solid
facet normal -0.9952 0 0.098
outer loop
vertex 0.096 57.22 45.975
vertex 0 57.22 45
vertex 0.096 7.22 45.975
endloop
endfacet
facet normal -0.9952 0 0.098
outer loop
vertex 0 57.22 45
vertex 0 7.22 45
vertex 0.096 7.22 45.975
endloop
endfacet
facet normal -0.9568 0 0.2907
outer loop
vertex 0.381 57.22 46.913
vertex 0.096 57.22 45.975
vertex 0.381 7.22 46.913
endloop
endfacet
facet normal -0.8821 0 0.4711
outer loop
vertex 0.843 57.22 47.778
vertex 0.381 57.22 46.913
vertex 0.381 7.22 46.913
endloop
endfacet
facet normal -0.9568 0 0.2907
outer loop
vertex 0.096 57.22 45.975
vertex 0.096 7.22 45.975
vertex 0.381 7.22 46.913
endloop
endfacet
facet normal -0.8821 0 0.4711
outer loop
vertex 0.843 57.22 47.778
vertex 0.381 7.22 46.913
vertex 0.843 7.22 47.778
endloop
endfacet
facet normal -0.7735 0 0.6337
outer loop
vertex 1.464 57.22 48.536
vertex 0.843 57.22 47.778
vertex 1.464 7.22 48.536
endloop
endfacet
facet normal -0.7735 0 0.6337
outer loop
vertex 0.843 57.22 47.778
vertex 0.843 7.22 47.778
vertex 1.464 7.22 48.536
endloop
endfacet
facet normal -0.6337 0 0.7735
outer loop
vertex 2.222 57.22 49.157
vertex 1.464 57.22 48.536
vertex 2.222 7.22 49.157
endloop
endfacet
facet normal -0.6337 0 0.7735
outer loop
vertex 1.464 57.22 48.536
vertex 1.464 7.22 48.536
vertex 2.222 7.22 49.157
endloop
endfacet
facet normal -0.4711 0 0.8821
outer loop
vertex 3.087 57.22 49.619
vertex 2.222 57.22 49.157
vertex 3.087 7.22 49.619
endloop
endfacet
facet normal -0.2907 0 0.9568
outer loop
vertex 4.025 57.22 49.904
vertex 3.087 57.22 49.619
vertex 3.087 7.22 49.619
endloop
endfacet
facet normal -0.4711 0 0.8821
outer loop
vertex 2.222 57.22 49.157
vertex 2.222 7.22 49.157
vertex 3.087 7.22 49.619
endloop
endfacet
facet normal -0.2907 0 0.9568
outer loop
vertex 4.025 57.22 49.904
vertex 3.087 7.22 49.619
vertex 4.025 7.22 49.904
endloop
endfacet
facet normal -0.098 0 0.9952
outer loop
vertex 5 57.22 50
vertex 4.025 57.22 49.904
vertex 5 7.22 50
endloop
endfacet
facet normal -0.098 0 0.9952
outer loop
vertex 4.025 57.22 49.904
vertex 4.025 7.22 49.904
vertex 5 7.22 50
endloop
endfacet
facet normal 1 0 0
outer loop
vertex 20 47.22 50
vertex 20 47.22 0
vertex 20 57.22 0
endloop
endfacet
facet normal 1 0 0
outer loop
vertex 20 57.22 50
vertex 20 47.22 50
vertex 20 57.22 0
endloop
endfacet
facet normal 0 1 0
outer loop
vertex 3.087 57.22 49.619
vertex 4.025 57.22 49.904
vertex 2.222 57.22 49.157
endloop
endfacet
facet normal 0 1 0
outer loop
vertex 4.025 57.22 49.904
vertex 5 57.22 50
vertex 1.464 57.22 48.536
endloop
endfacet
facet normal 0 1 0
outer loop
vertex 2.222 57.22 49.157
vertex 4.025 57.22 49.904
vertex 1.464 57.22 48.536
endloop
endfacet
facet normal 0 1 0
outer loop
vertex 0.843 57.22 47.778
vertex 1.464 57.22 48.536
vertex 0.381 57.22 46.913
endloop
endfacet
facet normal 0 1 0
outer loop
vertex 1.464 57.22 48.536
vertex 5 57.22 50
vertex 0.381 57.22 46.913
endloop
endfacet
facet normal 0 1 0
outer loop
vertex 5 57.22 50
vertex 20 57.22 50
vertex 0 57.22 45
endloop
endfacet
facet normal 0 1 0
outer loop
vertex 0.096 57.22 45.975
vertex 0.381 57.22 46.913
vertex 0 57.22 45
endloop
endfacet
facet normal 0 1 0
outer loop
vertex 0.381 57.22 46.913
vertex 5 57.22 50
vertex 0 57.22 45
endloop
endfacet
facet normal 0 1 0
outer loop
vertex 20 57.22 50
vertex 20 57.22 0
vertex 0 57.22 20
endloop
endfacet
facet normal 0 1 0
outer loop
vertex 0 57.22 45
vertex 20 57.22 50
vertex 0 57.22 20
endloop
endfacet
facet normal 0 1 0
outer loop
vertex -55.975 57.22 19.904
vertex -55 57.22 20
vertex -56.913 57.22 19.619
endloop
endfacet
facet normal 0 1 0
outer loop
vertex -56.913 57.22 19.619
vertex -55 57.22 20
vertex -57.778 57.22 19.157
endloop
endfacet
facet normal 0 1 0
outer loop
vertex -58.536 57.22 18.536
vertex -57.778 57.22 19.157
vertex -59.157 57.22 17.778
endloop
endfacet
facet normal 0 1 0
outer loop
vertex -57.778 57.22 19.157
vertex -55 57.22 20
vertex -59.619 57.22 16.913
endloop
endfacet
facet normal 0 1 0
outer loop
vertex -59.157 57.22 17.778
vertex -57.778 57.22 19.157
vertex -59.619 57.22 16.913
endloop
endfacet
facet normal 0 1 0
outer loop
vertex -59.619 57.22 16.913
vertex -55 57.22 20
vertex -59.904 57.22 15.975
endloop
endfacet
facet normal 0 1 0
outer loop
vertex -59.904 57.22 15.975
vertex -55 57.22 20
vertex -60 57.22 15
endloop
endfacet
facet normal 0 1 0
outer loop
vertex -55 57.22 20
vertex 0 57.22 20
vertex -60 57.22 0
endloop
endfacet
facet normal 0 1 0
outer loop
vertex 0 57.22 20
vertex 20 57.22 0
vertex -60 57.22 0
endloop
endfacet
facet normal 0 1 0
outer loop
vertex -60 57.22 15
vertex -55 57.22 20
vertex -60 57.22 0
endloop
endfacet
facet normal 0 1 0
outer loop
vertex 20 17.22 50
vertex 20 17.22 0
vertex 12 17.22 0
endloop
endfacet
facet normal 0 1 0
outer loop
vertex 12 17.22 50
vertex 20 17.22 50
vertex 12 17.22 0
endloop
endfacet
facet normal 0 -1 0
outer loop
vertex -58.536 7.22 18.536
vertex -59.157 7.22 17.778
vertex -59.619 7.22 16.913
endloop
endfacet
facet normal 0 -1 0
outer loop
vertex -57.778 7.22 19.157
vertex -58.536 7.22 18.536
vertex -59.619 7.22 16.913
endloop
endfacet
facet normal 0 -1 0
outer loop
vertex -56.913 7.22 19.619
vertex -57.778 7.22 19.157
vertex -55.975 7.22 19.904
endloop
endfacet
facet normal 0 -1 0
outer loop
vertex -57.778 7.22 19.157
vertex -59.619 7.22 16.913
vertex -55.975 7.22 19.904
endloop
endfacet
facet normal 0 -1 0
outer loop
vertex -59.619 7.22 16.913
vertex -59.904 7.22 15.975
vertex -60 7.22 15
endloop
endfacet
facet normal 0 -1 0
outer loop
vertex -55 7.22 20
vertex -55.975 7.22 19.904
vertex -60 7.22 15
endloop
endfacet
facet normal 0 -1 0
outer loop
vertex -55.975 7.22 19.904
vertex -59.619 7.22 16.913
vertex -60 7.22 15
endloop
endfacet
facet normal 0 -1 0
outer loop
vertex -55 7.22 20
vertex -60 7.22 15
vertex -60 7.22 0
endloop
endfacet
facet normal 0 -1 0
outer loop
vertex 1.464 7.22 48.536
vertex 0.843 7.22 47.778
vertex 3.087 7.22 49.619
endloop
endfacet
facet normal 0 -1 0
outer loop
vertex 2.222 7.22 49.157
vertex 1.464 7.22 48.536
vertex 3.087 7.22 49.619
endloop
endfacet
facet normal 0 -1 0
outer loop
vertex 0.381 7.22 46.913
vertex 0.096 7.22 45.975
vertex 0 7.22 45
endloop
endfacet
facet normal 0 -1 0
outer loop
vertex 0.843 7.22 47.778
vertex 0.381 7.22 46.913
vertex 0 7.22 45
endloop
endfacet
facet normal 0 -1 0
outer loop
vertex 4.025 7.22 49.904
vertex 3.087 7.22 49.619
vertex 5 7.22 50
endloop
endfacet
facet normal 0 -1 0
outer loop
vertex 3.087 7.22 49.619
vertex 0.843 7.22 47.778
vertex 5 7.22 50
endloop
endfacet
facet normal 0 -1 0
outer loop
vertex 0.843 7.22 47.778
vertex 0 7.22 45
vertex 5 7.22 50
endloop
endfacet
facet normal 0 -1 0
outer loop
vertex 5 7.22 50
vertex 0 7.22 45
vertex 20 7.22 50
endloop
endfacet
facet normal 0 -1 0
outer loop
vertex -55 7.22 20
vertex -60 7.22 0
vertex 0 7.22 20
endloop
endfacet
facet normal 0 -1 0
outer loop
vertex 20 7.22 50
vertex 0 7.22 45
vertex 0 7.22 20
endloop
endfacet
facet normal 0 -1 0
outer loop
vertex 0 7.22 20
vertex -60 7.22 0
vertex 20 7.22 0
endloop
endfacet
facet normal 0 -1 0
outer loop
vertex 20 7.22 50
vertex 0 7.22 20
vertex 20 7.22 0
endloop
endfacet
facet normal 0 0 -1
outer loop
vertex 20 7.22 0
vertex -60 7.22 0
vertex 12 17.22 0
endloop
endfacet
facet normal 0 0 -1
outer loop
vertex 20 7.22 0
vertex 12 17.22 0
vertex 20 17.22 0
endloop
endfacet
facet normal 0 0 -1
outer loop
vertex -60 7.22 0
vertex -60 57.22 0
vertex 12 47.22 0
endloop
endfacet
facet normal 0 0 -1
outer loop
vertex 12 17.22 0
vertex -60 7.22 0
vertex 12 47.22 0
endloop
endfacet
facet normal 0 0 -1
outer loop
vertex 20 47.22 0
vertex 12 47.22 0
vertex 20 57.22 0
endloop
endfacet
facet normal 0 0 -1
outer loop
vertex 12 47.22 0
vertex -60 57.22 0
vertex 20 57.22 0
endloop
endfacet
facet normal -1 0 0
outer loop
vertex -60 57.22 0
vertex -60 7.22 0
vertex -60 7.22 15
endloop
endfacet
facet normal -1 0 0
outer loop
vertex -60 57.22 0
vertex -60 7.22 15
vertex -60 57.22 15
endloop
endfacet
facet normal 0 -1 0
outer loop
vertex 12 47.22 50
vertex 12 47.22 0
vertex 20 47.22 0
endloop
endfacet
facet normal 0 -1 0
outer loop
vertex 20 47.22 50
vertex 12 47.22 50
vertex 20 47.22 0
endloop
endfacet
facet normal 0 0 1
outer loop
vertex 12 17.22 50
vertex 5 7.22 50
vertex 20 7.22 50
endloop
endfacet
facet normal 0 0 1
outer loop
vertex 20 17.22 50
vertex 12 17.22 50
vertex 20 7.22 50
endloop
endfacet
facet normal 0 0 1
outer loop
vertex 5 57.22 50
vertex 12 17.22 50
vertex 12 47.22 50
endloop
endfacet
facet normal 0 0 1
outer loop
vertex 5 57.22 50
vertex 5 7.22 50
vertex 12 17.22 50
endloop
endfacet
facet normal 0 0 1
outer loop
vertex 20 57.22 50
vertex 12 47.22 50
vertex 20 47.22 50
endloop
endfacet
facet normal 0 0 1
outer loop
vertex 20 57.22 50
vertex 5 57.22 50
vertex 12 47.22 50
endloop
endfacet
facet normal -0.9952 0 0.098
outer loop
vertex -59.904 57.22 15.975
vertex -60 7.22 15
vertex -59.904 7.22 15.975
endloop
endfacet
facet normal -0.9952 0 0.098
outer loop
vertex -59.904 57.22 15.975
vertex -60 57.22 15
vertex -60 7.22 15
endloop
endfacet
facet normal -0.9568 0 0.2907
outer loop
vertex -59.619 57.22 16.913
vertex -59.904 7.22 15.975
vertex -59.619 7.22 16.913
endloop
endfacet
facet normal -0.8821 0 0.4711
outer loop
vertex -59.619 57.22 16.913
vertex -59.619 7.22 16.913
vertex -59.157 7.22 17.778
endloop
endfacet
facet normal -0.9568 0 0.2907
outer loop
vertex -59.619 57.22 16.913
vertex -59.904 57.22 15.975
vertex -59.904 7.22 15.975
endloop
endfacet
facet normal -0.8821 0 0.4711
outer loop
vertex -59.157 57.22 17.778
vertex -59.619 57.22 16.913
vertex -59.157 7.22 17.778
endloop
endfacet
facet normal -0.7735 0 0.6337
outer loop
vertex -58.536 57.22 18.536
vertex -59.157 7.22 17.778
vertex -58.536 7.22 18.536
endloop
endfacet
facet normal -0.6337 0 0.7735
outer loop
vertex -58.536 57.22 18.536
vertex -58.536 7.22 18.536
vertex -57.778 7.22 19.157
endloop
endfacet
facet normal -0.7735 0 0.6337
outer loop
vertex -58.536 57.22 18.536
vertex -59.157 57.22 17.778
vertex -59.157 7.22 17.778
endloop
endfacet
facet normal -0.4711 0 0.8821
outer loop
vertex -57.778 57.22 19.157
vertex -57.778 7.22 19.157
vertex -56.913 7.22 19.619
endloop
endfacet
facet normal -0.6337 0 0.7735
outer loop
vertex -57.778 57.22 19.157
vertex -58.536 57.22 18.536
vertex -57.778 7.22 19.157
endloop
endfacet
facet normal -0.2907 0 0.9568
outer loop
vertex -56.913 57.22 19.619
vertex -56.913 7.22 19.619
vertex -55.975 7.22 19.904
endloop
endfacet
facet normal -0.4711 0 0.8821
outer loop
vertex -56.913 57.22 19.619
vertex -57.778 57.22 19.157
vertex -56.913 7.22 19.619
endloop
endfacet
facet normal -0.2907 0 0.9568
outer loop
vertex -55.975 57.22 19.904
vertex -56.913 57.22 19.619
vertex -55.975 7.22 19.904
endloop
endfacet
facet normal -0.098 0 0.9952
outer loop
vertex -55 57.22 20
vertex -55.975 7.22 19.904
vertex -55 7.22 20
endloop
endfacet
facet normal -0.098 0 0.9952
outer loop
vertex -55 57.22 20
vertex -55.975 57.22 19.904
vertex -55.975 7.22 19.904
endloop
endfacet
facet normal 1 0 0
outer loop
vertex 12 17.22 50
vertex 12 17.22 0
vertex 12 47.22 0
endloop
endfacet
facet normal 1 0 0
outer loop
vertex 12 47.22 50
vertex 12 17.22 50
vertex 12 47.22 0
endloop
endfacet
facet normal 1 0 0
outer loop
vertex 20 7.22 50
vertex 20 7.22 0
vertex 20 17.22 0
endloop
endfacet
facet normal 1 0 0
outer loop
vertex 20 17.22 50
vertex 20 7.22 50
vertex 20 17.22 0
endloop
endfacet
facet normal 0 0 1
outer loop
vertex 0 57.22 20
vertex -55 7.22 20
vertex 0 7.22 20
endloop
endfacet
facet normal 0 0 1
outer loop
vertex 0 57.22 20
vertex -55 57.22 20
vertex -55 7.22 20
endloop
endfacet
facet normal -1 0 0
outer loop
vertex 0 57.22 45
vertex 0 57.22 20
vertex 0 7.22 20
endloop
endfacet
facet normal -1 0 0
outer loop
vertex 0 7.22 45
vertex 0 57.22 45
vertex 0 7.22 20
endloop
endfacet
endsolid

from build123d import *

# Parameters (mm, degrees)
F0_W     = 60
F0_H     = 50
F1_DEPTH = 20
F2_DEPTH = 50
F3_R     = 5


with BuildPart() as f1:
    # F0 (on Top) → F1 (new body)
    with BuildSketch(Plane.XY):
        with Locations((-30, 32.220189)):
            Rectangle(F0_W, F0_H)
    extrude(amount=F1_DEPTH)

    # F0 (on Top) → F2 (join)
    with BuildSketch(Plane.XY):
        Polygon((0, 57.220189), (0, 7.220189), (20, 7.220189), (20, 17.220189), (12, 17.220189), (12, 47.220189), (20, 47.220189), (20, 57.220189), align=None)
    extrude(amount=F2_DEPTH)

    # F3
    f3_edges = [f1.edges().sort_by_distance(p)[0] for p in [
        (0, 32.220189, 50),
        (-60, 32.220189, 20),
    ]]
    fillet(f3_edges, radius=F3_R)


solid = f1.part
